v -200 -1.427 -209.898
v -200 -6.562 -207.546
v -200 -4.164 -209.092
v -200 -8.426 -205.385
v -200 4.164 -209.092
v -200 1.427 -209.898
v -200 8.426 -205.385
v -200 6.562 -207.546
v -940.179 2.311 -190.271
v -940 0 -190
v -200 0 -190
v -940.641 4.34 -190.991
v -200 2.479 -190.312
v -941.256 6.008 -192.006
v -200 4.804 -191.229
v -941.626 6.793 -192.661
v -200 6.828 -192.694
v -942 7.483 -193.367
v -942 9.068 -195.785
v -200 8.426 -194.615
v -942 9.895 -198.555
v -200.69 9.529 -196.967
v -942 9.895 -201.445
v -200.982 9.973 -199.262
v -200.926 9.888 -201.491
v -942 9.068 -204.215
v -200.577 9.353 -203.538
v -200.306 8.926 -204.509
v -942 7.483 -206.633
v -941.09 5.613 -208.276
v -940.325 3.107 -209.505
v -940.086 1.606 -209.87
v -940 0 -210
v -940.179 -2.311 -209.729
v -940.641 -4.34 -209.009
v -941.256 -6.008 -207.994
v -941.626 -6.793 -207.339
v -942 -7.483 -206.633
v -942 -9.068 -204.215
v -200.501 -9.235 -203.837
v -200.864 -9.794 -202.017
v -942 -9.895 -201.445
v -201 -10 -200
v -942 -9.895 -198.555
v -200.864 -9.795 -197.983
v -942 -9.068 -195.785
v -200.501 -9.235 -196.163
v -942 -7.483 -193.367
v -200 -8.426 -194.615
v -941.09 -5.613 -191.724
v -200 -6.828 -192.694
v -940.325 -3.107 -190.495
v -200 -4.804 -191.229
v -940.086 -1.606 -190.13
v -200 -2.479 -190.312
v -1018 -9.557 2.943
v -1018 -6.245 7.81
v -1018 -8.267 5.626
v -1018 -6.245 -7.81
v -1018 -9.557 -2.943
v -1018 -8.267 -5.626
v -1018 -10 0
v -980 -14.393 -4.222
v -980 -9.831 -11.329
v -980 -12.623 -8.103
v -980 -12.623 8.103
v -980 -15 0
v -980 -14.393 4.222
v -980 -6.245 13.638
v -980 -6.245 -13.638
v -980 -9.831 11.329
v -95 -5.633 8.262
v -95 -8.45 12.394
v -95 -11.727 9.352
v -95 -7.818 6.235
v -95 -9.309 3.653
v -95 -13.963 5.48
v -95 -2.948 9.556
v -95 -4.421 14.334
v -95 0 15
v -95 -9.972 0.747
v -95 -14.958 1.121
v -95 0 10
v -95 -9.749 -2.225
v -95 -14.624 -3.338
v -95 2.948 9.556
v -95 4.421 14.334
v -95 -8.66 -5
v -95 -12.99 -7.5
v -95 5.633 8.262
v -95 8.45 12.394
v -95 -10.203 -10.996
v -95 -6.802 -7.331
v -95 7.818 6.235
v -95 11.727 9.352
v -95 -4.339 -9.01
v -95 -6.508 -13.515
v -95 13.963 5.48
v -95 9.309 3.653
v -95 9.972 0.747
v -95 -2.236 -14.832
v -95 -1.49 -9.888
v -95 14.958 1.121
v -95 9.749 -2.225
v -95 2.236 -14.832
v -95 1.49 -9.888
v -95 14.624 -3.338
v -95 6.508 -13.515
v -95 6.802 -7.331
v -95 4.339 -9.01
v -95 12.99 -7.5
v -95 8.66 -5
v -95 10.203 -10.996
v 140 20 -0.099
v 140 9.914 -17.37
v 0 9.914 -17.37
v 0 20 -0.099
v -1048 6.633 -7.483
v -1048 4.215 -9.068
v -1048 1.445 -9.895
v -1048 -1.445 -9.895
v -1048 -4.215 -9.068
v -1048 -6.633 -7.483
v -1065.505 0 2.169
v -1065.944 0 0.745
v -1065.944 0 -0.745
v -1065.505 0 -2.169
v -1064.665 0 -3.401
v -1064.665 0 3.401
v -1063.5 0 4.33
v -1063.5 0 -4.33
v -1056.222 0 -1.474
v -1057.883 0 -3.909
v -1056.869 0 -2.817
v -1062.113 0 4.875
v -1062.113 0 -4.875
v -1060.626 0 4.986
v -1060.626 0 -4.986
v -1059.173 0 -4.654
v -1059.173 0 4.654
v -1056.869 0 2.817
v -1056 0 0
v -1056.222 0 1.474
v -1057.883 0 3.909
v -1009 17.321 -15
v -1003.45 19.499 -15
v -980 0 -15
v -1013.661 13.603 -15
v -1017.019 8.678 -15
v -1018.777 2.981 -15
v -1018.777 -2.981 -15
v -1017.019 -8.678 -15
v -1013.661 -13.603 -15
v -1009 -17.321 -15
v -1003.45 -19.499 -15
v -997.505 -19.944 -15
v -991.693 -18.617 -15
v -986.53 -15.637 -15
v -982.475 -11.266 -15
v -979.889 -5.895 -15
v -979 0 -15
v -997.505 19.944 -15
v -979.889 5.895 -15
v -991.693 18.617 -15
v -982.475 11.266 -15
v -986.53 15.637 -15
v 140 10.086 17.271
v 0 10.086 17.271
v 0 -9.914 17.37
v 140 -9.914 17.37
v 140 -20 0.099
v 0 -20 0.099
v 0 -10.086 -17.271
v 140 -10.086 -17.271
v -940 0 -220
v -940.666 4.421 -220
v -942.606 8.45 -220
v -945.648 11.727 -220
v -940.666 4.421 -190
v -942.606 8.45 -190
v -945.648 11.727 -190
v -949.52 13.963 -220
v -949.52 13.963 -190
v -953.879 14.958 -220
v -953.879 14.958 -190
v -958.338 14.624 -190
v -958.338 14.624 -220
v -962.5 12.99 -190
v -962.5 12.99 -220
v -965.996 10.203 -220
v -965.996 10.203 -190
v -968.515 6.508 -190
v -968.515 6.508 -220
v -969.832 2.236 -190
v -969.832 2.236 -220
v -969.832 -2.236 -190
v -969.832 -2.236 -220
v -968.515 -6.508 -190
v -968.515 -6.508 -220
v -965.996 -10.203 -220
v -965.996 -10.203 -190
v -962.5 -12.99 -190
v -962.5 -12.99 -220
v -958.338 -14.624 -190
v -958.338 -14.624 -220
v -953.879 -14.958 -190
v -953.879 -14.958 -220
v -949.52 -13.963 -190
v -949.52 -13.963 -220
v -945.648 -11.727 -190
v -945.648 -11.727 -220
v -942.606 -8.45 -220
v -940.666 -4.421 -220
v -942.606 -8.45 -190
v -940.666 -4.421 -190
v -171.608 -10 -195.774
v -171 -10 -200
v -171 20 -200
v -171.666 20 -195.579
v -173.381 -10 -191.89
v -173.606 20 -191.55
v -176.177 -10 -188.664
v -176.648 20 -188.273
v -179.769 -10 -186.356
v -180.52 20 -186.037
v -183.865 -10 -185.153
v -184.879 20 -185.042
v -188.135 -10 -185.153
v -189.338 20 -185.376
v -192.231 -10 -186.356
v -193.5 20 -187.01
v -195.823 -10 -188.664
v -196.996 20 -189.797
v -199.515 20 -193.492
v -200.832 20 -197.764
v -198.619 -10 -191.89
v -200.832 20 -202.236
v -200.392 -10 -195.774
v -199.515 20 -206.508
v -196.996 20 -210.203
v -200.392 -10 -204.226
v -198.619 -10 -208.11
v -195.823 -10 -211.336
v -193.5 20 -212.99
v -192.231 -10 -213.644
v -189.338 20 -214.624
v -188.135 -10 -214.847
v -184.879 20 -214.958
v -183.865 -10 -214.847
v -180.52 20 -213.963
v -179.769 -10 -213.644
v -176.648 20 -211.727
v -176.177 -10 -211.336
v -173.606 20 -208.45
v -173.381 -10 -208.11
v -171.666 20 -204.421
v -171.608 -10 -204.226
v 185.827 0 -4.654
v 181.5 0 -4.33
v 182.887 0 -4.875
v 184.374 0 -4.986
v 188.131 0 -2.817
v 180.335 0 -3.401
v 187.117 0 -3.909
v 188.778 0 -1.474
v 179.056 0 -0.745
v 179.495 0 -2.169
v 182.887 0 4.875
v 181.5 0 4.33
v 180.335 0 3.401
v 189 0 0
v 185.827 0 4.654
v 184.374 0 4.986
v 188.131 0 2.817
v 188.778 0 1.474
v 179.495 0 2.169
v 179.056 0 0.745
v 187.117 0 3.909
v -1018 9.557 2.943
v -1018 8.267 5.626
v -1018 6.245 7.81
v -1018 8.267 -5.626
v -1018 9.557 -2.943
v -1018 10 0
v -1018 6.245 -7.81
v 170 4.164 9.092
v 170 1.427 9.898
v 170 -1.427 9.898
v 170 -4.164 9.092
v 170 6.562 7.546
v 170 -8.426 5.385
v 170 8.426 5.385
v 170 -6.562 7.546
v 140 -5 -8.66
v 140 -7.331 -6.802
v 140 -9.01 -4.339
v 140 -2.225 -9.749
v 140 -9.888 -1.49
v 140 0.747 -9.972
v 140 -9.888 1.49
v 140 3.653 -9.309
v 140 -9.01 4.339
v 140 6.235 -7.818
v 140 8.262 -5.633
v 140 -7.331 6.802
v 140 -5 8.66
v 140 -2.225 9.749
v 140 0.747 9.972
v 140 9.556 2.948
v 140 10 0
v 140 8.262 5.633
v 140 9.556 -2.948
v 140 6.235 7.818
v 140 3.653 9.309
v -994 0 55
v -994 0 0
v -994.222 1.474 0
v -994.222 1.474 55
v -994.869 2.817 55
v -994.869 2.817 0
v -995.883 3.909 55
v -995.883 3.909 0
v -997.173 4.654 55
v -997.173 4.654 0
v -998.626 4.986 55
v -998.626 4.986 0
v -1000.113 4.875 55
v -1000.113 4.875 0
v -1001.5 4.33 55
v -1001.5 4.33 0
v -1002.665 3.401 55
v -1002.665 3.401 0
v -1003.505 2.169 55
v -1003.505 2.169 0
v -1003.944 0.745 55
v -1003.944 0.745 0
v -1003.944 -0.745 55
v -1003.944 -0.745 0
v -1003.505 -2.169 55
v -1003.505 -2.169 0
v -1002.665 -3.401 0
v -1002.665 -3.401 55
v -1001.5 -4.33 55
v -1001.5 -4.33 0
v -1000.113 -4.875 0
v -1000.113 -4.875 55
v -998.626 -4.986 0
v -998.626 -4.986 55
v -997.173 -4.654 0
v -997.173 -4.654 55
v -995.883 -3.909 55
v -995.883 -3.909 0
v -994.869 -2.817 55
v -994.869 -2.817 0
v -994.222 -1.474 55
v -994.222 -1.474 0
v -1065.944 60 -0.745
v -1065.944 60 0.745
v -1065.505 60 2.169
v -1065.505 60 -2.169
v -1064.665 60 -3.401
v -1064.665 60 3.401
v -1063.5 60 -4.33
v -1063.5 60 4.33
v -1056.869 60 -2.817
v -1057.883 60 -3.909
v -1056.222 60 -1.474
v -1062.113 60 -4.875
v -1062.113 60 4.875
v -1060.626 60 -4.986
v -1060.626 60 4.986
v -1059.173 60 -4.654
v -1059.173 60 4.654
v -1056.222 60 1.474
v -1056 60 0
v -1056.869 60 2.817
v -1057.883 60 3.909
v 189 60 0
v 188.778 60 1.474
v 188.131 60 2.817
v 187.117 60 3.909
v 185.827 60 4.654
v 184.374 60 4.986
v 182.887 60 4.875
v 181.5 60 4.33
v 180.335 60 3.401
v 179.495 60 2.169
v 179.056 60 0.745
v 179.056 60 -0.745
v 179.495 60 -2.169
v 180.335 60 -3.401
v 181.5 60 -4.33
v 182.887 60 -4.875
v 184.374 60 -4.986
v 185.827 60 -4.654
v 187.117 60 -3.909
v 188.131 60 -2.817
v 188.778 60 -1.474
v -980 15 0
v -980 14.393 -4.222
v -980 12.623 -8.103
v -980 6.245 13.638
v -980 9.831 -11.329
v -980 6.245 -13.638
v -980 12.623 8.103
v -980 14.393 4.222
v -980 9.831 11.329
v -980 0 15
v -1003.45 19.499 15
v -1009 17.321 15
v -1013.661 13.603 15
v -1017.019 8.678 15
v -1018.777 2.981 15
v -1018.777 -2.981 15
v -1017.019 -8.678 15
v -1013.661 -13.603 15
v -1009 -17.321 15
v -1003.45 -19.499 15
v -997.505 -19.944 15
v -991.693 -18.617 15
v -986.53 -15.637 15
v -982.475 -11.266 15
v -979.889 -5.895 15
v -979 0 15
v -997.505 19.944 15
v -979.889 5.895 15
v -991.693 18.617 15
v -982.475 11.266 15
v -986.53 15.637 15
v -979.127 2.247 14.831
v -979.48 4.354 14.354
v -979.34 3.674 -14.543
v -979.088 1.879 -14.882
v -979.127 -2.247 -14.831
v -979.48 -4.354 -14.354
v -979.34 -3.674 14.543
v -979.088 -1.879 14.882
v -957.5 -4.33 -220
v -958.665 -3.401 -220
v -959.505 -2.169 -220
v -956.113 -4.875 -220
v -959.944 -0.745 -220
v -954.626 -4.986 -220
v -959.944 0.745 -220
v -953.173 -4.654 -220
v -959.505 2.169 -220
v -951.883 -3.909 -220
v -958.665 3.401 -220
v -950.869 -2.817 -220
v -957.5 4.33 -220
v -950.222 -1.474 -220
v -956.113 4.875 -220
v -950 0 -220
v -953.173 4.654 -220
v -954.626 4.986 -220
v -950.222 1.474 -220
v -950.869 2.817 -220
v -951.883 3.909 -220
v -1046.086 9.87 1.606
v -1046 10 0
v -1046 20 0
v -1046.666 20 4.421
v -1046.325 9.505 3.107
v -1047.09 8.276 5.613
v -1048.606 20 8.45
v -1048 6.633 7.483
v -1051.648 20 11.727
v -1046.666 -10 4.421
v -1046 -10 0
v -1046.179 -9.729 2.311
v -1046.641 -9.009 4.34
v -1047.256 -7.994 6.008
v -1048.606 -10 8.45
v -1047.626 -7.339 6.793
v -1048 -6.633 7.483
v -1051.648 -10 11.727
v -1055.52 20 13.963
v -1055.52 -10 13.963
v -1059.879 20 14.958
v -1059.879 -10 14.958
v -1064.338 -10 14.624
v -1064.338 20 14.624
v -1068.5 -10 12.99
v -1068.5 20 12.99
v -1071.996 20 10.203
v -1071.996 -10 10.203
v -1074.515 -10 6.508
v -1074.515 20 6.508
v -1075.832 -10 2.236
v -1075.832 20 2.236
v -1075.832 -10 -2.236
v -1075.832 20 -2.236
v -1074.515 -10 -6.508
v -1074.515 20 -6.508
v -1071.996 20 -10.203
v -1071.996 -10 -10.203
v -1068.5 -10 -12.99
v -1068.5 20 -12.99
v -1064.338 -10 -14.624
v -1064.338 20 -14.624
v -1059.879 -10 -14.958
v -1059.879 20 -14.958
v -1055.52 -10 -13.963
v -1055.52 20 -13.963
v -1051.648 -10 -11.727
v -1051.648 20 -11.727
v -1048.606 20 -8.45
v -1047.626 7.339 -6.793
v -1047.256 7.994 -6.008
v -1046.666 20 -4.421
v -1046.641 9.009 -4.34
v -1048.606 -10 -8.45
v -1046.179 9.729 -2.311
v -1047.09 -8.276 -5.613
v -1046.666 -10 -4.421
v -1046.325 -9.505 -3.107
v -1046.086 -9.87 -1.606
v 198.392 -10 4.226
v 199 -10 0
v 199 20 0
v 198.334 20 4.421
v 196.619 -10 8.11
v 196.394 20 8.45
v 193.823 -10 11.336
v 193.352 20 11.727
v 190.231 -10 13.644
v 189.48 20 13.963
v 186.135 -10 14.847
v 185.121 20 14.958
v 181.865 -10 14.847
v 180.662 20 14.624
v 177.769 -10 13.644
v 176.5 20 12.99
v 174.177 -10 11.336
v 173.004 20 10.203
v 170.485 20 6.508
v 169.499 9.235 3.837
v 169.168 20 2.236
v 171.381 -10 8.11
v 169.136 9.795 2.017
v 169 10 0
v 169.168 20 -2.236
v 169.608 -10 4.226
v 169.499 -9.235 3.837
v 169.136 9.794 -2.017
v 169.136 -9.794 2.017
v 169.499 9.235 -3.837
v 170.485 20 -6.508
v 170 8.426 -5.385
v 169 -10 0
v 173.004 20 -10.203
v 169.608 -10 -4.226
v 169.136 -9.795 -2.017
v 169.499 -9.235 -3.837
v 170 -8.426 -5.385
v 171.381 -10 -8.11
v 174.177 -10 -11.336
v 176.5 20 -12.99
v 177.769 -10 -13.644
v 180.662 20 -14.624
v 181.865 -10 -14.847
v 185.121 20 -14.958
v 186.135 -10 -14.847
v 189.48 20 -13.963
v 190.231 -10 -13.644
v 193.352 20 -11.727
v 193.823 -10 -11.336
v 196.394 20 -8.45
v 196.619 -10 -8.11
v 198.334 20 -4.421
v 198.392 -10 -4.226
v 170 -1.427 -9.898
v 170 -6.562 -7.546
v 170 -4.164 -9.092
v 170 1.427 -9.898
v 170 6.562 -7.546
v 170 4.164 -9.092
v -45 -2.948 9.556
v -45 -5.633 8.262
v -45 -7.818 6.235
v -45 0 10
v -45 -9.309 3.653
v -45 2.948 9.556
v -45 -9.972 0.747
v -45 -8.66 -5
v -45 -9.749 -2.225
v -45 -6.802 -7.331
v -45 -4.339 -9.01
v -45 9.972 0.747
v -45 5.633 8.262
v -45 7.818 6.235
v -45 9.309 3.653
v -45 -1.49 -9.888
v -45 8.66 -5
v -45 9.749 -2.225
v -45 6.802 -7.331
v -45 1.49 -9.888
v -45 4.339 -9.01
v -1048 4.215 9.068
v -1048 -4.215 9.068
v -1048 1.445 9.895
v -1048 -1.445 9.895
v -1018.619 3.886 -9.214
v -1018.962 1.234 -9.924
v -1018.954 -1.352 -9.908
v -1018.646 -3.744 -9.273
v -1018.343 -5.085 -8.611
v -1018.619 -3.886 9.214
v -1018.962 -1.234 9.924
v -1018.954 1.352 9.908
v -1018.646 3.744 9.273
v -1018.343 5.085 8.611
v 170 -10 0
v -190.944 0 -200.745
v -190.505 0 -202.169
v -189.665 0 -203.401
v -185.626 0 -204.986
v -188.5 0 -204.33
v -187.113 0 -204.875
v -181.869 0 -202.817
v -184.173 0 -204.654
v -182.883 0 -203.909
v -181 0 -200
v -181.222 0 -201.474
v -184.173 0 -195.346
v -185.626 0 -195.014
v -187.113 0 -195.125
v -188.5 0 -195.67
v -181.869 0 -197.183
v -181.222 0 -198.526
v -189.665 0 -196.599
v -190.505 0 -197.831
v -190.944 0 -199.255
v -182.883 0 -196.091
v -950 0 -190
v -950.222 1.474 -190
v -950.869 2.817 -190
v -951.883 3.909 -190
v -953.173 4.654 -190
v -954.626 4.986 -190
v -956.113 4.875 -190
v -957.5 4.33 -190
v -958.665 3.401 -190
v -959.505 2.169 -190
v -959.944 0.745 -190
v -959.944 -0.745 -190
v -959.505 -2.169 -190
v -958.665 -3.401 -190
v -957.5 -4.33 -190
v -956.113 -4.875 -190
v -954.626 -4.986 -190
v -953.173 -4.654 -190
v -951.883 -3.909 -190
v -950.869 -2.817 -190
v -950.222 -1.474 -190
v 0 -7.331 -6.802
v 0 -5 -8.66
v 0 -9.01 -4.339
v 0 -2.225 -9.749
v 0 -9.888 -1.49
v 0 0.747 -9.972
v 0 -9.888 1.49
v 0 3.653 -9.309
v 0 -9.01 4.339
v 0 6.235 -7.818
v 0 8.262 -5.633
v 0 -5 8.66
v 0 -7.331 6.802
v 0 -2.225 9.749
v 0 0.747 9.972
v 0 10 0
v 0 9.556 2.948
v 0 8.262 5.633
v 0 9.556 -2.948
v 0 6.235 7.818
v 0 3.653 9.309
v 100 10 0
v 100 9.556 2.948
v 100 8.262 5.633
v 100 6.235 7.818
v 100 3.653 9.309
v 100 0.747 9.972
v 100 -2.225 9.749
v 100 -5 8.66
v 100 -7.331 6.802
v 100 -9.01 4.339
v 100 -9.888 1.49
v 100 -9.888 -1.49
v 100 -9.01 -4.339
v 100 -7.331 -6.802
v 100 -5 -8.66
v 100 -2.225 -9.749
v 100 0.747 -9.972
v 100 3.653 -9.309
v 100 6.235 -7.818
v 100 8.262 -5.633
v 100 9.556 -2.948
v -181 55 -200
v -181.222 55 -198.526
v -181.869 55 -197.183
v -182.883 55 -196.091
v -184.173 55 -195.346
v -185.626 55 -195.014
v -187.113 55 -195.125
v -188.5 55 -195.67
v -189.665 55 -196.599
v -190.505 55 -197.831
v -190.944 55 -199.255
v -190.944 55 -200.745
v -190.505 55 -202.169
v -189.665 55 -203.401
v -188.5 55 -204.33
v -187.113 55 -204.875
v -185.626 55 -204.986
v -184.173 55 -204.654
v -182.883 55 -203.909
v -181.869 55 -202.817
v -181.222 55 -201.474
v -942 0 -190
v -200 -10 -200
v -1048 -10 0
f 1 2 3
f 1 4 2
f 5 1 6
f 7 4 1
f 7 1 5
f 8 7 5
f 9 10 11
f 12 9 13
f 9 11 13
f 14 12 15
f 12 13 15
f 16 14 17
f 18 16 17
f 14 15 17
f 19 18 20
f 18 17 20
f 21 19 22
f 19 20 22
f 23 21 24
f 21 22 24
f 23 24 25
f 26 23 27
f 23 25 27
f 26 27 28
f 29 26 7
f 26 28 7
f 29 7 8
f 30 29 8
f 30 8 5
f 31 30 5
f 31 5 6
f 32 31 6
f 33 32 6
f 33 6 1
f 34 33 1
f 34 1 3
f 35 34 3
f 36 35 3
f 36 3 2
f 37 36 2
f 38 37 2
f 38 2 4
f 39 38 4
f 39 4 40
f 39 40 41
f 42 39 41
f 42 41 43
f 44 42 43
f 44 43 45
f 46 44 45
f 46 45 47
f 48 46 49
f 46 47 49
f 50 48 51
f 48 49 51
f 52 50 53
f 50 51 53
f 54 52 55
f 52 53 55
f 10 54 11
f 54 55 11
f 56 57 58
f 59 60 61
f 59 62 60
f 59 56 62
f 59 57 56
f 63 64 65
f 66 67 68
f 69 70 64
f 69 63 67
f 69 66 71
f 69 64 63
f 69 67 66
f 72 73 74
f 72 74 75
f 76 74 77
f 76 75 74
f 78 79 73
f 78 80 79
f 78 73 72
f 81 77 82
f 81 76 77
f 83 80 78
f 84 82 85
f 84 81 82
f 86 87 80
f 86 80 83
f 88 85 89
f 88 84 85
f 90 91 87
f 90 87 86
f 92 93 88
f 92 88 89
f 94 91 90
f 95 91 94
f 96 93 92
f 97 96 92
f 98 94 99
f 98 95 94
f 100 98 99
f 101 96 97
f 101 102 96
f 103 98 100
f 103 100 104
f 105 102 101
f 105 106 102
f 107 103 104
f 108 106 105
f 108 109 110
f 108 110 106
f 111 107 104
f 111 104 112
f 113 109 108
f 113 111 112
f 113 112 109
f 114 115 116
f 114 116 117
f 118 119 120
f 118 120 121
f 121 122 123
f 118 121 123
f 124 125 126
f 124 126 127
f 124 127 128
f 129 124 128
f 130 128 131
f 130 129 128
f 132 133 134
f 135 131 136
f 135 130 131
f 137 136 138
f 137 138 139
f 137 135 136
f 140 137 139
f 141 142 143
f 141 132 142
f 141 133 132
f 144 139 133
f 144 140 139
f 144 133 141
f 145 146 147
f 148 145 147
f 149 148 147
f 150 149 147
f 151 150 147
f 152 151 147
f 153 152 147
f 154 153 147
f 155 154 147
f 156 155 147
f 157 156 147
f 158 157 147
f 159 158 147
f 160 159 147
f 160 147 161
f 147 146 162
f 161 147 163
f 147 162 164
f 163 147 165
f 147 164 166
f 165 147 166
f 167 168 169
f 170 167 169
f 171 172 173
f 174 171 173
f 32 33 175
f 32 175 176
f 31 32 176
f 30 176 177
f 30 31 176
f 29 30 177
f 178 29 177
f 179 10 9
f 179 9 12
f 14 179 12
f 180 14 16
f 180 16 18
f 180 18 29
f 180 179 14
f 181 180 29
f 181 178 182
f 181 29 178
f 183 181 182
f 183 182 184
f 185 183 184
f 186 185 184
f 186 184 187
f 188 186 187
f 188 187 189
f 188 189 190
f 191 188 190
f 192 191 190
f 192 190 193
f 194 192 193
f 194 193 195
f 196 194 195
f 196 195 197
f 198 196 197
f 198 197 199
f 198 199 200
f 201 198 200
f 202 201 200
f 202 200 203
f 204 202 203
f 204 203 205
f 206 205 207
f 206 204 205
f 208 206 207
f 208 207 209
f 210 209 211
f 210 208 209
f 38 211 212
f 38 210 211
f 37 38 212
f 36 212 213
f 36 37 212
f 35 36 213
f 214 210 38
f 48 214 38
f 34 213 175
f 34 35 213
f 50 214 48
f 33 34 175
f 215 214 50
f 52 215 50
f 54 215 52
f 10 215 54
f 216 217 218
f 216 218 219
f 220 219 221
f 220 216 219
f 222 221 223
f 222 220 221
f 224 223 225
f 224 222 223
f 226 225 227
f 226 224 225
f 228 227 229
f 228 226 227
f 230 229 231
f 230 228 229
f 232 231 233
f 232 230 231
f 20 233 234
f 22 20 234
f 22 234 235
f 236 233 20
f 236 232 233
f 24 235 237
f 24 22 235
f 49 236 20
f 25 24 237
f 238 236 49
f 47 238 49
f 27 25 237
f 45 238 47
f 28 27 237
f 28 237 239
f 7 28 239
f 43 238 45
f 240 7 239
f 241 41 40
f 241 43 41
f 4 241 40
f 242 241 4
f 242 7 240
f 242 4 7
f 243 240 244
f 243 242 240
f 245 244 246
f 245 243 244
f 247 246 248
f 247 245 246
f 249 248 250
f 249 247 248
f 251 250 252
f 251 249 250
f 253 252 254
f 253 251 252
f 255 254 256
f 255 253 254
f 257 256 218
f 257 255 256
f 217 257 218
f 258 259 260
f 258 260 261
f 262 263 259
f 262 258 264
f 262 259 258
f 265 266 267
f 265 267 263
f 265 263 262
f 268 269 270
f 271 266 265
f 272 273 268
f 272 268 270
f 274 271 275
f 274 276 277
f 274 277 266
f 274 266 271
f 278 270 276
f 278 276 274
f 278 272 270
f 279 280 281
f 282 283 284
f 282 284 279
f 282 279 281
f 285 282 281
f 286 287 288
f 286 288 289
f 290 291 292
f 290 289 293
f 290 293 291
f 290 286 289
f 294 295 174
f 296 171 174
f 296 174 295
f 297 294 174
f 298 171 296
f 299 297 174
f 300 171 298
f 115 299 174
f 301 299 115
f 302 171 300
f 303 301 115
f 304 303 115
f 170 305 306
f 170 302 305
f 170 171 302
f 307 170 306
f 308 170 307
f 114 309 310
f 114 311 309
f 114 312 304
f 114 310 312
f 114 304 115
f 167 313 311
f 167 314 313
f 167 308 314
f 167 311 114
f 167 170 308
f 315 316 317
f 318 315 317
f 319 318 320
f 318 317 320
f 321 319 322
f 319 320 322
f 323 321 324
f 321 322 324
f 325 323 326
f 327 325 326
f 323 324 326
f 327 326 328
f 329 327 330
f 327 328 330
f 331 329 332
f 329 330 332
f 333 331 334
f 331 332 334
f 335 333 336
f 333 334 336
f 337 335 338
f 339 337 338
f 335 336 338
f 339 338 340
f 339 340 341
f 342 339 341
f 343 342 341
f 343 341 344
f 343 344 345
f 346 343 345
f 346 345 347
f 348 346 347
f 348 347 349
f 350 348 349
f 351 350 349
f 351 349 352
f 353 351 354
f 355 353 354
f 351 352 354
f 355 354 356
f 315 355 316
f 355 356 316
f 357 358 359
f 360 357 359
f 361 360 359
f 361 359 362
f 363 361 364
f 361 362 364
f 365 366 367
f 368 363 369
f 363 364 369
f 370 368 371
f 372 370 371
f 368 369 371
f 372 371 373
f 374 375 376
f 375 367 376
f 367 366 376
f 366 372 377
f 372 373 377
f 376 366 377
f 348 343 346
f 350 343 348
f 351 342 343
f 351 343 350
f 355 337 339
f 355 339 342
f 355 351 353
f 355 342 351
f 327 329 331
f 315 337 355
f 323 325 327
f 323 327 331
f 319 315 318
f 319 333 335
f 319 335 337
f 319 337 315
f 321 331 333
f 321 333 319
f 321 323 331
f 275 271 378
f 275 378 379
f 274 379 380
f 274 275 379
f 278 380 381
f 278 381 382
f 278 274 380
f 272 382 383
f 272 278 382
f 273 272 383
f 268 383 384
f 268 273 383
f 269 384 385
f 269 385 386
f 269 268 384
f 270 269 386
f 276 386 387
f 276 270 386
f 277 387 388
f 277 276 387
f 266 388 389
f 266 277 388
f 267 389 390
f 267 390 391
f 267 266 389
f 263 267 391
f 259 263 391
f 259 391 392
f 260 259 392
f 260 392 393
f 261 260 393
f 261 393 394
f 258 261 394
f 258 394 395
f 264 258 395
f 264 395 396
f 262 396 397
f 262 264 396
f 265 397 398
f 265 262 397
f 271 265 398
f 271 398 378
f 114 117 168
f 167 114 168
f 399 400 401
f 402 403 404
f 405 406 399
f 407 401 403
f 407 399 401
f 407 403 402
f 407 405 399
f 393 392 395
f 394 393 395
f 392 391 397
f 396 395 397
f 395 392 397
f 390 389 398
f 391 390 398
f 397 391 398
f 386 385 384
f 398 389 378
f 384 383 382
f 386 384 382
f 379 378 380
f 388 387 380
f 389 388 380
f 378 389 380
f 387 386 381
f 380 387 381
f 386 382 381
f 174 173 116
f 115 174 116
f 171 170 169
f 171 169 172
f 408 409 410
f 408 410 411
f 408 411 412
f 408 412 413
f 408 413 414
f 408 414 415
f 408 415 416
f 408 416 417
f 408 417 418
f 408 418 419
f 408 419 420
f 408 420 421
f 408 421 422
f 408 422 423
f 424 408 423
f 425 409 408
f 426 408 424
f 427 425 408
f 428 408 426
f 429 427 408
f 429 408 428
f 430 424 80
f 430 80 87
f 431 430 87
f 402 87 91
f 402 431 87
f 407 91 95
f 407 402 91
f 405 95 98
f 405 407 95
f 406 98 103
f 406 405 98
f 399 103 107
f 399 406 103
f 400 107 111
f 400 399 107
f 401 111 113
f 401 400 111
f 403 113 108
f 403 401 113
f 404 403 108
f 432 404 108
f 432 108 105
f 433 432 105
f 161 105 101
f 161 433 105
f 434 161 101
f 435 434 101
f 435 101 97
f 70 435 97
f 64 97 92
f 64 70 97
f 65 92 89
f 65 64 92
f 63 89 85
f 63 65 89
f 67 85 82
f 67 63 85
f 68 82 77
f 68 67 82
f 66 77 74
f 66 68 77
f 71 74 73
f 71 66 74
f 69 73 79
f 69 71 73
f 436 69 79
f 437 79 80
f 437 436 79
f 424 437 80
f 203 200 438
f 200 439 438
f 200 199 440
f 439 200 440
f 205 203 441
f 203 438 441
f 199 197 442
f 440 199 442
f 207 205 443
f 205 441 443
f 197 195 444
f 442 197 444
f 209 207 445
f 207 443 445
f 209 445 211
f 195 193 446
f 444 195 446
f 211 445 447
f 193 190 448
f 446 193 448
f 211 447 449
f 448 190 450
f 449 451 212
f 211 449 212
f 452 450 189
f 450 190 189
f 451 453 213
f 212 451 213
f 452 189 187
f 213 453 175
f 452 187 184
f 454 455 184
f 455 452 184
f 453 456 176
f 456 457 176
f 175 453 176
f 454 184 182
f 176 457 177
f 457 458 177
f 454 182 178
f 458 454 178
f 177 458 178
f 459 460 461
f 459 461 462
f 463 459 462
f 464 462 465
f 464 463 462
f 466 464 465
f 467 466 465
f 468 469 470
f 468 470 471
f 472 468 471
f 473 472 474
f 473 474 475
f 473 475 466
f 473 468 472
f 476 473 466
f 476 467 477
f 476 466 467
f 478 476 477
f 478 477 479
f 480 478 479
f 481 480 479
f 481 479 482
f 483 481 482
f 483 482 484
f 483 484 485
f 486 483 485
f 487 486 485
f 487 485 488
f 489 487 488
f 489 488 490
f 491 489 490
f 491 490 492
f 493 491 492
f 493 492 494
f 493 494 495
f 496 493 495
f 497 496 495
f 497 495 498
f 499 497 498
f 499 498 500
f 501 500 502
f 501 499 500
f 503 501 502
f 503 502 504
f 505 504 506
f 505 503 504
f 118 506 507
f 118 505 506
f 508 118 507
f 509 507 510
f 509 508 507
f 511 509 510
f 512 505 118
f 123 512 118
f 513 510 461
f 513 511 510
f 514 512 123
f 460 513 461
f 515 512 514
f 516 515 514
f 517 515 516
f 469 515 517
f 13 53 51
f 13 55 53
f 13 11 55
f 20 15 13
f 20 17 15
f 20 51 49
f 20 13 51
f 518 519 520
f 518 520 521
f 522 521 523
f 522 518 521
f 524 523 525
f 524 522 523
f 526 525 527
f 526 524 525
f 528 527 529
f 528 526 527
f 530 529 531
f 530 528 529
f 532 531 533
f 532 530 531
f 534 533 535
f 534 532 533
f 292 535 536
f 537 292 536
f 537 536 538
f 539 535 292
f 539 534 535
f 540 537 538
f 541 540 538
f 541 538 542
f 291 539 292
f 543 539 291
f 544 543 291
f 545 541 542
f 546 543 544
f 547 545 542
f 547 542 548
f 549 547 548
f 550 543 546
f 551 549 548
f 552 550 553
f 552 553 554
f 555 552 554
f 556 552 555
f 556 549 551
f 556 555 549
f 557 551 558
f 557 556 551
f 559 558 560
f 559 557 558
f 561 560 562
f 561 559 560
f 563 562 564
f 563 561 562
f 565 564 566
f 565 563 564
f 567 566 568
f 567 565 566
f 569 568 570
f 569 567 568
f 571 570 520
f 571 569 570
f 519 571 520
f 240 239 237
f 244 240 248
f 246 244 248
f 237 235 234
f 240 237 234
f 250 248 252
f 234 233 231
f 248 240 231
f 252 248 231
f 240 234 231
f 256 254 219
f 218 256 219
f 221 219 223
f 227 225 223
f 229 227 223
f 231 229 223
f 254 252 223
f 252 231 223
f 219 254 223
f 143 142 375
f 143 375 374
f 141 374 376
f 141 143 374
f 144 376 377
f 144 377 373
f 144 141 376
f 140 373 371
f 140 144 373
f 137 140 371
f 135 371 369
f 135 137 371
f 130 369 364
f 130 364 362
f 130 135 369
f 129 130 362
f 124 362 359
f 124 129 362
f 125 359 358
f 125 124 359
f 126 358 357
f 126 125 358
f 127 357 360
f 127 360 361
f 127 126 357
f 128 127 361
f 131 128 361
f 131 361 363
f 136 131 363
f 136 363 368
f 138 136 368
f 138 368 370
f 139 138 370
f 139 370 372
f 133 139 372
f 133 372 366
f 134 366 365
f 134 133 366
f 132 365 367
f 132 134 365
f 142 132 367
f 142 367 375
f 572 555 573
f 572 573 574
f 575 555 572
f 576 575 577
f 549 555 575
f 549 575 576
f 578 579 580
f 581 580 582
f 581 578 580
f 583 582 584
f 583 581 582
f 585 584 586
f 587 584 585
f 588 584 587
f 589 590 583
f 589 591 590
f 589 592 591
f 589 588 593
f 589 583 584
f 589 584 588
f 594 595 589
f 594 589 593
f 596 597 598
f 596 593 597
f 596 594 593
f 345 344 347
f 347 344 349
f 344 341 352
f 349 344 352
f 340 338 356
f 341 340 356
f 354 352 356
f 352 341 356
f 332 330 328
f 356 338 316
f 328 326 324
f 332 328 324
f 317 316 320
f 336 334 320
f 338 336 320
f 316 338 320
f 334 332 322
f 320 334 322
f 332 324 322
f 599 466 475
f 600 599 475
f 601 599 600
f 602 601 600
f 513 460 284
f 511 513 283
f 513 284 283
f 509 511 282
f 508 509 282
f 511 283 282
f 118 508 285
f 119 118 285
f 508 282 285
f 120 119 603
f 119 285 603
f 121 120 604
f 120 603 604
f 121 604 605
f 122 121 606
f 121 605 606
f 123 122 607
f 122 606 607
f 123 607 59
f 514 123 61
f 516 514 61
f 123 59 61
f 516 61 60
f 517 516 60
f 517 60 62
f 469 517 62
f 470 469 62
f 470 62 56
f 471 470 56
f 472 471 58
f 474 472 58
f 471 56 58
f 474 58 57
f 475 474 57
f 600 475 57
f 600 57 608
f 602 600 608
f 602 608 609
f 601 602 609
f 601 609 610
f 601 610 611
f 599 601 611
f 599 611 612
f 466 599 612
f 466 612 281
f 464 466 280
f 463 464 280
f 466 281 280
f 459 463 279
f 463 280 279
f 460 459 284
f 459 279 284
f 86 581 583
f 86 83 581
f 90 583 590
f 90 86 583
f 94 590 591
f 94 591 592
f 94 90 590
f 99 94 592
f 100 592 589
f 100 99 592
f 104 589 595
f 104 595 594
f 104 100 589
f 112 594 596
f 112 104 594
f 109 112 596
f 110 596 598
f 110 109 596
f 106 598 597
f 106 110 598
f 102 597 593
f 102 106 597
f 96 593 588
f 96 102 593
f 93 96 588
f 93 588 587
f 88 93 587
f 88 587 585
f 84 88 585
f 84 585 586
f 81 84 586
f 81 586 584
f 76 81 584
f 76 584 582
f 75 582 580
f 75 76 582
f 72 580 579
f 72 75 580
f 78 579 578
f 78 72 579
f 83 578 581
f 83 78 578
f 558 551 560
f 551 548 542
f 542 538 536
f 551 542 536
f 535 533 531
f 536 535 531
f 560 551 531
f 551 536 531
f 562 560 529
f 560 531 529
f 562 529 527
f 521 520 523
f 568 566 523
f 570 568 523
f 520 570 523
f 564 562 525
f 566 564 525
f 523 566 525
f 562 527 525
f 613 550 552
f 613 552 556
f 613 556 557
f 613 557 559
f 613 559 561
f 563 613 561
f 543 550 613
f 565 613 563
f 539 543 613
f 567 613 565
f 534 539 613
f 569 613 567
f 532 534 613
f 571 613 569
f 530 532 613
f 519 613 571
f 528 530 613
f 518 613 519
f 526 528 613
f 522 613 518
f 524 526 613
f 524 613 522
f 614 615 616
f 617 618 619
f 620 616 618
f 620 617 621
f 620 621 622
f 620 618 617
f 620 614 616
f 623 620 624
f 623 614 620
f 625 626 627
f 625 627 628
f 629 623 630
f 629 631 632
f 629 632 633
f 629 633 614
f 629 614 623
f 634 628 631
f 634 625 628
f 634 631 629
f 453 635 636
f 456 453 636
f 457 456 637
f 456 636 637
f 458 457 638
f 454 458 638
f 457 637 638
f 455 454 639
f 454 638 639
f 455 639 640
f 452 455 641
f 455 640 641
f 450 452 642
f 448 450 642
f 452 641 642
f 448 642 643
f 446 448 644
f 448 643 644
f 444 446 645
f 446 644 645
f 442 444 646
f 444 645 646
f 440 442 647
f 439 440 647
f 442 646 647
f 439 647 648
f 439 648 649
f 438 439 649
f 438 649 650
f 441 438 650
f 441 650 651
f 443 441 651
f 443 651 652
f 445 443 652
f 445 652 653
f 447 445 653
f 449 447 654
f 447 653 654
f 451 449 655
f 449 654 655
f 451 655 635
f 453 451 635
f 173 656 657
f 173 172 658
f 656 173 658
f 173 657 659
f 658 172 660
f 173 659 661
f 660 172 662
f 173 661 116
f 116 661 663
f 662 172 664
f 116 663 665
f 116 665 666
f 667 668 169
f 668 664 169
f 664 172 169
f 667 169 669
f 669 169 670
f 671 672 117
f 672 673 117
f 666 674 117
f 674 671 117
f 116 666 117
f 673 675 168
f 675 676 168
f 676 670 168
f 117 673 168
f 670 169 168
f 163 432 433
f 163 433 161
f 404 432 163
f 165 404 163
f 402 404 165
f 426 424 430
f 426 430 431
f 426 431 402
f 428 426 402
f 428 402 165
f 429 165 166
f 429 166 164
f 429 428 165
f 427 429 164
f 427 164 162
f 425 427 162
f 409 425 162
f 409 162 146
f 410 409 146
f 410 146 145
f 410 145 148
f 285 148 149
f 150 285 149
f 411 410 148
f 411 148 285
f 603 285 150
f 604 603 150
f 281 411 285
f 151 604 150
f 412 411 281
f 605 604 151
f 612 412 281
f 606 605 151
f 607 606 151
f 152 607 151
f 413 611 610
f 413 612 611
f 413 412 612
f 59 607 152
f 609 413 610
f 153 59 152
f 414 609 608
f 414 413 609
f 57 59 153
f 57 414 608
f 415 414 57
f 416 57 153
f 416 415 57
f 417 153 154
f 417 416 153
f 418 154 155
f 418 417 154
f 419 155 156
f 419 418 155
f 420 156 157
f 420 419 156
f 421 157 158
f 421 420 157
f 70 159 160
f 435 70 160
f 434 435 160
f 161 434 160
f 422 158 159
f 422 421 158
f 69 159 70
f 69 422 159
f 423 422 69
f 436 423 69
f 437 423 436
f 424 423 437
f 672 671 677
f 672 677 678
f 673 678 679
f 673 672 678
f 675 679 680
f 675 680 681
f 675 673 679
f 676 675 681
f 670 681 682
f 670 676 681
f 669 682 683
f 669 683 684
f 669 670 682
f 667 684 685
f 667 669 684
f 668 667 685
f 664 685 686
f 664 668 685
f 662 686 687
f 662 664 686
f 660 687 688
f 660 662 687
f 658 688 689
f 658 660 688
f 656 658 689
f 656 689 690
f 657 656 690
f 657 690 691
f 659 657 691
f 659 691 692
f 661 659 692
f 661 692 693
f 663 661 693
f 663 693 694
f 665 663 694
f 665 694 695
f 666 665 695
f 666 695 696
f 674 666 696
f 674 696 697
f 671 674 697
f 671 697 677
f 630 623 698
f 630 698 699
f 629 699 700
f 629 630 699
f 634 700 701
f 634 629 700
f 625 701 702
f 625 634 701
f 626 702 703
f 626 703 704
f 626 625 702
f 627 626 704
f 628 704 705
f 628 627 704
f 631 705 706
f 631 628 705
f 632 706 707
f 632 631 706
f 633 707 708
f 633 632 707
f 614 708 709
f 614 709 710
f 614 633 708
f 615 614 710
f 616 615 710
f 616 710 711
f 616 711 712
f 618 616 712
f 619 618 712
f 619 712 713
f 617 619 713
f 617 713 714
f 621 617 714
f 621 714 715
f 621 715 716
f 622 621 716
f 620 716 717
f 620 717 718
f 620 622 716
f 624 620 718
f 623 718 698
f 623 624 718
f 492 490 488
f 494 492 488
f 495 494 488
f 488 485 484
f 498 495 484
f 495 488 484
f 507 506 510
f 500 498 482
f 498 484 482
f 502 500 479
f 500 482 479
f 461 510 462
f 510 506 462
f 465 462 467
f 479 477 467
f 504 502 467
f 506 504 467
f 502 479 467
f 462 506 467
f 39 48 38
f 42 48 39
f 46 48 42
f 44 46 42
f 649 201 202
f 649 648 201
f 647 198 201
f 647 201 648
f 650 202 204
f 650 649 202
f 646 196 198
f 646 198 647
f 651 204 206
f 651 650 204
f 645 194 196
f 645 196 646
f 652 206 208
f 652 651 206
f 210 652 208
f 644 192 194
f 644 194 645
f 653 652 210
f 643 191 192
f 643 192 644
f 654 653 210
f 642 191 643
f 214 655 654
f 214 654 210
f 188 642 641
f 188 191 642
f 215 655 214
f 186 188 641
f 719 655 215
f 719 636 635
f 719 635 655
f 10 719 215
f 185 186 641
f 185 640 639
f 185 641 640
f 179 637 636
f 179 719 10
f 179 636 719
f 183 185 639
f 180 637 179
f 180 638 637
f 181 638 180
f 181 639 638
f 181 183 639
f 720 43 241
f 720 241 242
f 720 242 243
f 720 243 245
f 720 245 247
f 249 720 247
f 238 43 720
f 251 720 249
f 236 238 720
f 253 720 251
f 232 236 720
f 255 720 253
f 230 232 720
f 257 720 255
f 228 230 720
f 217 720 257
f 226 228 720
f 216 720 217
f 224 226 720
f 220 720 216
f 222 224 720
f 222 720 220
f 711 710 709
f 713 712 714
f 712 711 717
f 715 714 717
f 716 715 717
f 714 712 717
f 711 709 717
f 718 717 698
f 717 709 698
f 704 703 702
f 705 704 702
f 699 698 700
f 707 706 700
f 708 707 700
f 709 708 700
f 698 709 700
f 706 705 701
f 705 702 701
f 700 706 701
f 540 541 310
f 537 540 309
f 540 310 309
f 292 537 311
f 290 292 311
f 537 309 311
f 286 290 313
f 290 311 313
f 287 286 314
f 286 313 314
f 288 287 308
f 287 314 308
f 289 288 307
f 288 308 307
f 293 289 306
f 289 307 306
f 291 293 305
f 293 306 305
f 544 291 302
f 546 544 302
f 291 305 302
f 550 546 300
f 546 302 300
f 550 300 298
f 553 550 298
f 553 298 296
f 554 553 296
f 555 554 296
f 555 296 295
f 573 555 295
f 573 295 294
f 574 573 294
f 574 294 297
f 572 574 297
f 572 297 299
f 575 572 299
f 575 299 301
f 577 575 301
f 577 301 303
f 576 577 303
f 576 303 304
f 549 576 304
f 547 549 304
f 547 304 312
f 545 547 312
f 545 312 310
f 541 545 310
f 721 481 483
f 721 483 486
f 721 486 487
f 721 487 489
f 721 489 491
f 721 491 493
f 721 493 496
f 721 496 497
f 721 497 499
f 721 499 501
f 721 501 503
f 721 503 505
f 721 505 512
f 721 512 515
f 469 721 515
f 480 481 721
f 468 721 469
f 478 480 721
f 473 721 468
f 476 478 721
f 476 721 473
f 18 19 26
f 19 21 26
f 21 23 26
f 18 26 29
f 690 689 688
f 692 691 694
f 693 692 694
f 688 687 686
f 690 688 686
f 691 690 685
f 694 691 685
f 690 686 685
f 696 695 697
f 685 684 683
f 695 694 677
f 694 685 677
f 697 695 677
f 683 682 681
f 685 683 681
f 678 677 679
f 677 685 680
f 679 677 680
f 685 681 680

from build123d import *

# Parameters (mm, degrees)
F0_R      = 10
F1_DEPTH  = 140
F3_R      = 10
F4_DEPTH  = 70
F7_DEPTH  = 30
F9_DEPTH  = 60
F13_R     = 20
F14_DEPTH = 30
F15_R     = 5
F16_DEPTH = 55
F17_W     = 30
F17_H     = 10
F19_R     = 15
F20_DEPTH = 30
F21_R     = 5
F22_DEPTH = 60
F23_W     = 742
F23_H     = 10
F25_R     = 15
F26_DEPTH = 30
F27_R     = 5
F28_DEPTH = 55
F30_R     = 15
F30_R_2   = 5
F31_DEPTH = 30


with BuildPart() as f1:
    # F0 (on Right) → F1 (new body)
    with BuildSketch(Plane.YZ):
        Polygon((19.9997544387, -0.0991079843), (10.0857072515, 17.2707414212), (-9.9140471872, 17.3698494055), (-19.9997544387, 0.0991079843), (-10.0857072515, -17.2707414212), (9.9140471872, -17.3698494055), align=None)
        Circle(F0_R, mode=Mode.SUBTRACT)
    extrude(amount=F1_DEPTH)

    # F3 (on offset) → F4 (join)
    with BuildSketch(Plane.YZ.offset(100)):
        Circle(F3_R)
    extrude(amount=F4_DEPTH)

    # F6 (on offset) → F7 (join)
    with BuildSketch(Plane.XZ.offset(10)):
        with BuildLine():
            ThreePointArc((169, 0), (184, -15), (199, 0))
            ThreePointArc((199, 0), (184, 15), (169, 0))
        make_face()
    extrude(amount=-F7_DEPTH)


with BuildPart() as f9:
    # F8 (on Front) → F9 (new body)
    with BuildSketch(Plane.XZ):
        with BuildLine():
            ThreePointArc((179, 0), (184, -5), (189, 0))
            ThreePointArc((189, 0), (184, 5), (179, 0))
        make_face()
    extrude(amount=-F9_DEPTH)


with BuildPart() as f11:
    # F10 (on Front) → F11 (revolve)
    with BuildSketch(Plane.XZ):
        Polygon((-980, 0), (-45, 0), (-45, 10), (-95, 10), (-95, 15), (-980, 15), align=None)
    revolve(axis=Axis((-512.5, 0, 0), (-1, 0, 0)))

    # F13 (on offset) → F14 (join)
    with BuildSketch(Plane.XY.offset(15)):
        with Locations((-999, 0)):
            Circle(F13_R)
    extrude(amount=-F14_DEPTH)

    # F17 (on Top) → F18 (revolve)
    with BuildSketch(Plane.XY):
        with Locations((-1033, 5)):
            Rectangle(F17_W, F17_H)
    revolve(axis=Axis((-1033, 0, 0), (-1, 0, 0)))

    # F19 (on offset) → F20 (join)
    with BuildSketch(Plane.XZ.offset(10)):
        with Locations((-1061, 0)):
            Circle(F19_R)
    extrude(amount=-F20_DEPTH)


with BuildPart() as f16:
    # F15 (on Top) → F16 (new body)
    with BuildSketch(Plane.XY):
        with Locations((-999, 0)):
            Circle(F15_R)
    extrude(amount=F16_DEPTH)


with BuildPart() as f22:
    # F21 (on Front) → F22 (new body)
    with BuildSketch(Plane.XZ):
        with Locations((-1061, 0)):
            Circle(F21_R)
    extrude(amount=-F22_DEPTH)


with BuildPart() as f24:
    # F23 (on Front) → F24 (revolve)
    with BuildSketch(Plane.XZ):
        with Locations((-571, -195)):
            Rectangle(F23_W, F23_H)
    revolve(axis=Axis((-571, 0, -200), (-1, 0, 0)))

    # F25 (on offset) → F26 (join)
    with BuildSketch(Plane.XZ.offset(10)):
        with Locations((-186, -200)):
            Circle(F25_R)
    extrude(amount=-F26_DEPTH)

    # F30 (on offset) → F31 (join)
    with BuildSketch(Plane.XY.offset(-190)):
        with Locations((-955, 0)):
            Circle(F30_R)
        with Locations((-955, 0)):
            Circle(F30_R_2, mode=Mode.SUBTRACT)
    extrude(amount=-F31_DEPTH)


with BuildPart() as f28:
    # F27 (on Front) → F28 (new body)
    with BuildSketch(Plane.XZ):
        with Locations((-186, -200)):
            Circle(F27_R)
    extrude(amount=-F28_DEPTH)


solid = Compound([f1.part, f9.part, f11.part, f16.part, f22.part, f24.part, f28.part])
